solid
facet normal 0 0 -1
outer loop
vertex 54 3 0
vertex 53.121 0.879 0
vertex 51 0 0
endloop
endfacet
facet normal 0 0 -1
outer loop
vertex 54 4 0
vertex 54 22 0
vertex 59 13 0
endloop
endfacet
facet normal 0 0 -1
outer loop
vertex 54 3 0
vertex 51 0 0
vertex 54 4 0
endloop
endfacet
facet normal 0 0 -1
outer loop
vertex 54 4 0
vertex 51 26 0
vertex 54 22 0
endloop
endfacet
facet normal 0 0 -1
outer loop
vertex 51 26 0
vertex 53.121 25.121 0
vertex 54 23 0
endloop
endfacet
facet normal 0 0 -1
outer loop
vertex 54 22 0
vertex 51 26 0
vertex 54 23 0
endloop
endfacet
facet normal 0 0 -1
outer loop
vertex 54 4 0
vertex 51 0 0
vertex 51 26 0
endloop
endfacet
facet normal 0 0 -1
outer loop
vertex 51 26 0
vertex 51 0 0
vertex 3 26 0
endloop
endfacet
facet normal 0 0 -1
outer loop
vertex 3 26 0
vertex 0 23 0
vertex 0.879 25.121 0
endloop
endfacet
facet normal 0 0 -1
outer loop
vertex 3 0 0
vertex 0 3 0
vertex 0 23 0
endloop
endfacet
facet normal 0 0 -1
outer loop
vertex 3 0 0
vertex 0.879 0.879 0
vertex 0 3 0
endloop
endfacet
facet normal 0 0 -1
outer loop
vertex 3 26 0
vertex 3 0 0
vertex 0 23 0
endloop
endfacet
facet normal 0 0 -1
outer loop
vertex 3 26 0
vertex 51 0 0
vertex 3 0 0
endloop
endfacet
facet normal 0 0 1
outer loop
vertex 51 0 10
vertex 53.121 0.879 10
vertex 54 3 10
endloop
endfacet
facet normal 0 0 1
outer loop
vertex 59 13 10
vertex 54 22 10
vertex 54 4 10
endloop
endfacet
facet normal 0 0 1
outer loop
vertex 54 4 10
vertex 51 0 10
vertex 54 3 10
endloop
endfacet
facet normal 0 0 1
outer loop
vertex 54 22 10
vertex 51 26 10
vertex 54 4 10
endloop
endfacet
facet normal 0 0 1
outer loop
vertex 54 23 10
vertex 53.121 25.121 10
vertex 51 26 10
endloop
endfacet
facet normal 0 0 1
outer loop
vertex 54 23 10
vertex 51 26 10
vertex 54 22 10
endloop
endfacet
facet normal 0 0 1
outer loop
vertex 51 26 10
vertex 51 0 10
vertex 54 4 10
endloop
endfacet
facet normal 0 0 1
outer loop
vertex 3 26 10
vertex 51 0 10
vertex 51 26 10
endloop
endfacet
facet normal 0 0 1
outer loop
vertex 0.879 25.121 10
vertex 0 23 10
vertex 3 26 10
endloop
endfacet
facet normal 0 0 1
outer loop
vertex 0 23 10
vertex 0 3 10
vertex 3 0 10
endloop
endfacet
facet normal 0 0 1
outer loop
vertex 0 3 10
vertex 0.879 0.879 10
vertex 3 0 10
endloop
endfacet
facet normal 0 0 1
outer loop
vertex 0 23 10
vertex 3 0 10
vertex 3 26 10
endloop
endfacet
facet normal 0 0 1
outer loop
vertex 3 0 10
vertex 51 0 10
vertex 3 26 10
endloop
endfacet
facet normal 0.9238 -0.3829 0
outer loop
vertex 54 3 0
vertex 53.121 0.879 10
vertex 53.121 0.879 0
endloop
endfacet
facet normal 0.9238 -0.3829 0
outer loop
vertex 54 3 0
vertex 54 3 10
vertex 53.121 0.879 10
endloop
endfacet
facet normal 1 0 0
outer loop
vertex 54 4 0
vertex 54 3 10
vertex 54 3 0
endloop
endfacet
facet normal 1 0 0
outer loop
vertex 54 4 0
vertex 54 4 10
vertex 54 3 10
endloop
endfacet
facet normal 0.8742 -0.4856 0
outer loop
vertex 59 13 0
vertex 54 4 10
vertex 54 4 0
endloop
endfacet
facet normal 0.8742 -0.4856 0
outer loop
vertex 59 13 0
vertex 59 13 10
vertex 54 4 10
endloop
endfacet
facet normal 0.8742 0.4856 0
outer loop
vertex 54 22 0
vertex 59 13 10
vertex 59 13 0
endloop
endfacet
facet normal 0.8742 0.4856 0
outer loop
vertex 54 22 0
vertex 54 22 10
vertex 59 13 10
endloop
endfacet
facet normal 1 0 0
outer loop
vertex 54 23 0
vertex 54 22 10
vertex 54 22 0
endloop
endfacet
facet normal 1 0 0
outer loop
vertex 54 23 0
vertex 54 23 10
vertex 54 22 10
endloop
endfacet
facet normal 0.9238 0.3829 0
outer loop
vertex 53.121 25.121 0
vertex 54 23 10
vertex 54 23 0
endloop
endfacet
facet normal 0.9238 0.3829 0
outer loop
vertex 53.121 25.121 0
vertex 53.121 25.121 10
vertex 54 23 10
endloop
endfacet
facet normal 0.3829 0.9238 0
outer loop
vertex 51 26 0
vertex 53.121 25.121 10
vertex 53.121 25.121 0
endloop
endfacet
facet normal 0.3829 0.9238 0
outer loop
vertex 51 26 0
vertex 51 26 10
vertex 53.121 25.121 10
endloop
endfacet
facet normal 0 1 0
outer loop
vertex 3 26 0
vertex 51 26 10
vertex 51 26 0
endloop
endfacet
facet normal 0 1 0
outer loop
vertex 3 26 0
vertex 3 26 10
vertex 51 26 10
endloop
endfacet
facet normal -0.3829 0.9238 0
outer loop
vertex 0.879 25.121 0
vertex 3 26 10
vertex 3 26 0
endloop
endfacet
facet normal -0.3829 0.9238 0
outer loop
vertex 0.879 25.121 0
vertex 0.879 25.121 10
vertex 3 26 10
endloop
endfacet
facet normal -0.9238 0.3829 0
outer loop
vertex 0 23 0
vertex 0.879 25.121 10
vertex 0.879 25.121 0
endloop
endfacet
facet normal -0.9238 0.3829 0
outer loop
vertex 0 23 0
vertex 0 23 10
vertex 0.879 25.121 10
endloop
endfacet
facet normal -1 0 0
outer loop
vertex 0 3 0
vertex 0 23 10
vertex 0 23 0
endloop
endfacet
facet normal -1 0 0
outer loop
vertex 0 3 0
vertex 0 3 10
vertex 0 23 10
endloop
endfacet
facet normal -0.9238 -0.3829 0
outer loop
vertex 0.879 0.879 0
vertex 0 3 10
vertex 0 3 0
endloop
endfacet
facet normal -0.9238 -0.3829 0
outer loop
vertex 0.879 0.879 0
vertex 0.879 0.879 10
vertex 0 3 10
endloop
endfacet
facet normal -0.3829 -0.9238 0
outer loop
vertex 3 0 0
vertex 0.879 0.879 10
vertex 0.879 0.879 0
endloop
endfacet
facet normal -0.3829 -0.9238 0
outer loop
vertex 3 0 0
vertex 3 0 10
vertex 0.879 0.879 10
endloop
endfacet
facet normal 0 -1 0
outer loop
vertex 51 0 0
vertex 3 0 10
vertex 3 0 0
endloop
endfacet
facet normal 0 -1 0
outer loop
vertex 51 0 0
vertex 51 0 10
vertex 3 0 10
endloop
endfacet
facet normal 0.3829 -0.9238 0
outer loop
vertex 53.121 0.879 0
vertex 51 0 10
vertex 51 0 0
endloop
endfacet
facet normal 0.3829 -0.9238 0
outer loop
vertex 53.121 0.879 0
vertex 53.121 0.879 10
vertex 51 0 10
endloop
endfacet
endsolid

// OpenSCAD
$fn = 32;

// ----------------------------------------------------------------------
// Ratchet pawl: 54 x 26 mm body, beak 5 mm с правого торца
// ----------------------------------------------------------------------

// --- parameters (mm) ---
profile_height = 10;      // extrusion height
profile_points = 15;      // points of the closed outline

profile = [[0, 3], [0.879, 0.879], [3, 0], [51, 0], [53.121, 0.879], [54, 3], [54, 4], [59, 13], [54, 22], [54, 23], [53.121, 25.121], [51, 26], [3, 26], [0.879, 25.121], [0, 23]];  // single closed polygon, 15 points, counter clockwise

// --- the one profile operation ---
linear_extrude(height = profile_height) polygon(points = profile);
